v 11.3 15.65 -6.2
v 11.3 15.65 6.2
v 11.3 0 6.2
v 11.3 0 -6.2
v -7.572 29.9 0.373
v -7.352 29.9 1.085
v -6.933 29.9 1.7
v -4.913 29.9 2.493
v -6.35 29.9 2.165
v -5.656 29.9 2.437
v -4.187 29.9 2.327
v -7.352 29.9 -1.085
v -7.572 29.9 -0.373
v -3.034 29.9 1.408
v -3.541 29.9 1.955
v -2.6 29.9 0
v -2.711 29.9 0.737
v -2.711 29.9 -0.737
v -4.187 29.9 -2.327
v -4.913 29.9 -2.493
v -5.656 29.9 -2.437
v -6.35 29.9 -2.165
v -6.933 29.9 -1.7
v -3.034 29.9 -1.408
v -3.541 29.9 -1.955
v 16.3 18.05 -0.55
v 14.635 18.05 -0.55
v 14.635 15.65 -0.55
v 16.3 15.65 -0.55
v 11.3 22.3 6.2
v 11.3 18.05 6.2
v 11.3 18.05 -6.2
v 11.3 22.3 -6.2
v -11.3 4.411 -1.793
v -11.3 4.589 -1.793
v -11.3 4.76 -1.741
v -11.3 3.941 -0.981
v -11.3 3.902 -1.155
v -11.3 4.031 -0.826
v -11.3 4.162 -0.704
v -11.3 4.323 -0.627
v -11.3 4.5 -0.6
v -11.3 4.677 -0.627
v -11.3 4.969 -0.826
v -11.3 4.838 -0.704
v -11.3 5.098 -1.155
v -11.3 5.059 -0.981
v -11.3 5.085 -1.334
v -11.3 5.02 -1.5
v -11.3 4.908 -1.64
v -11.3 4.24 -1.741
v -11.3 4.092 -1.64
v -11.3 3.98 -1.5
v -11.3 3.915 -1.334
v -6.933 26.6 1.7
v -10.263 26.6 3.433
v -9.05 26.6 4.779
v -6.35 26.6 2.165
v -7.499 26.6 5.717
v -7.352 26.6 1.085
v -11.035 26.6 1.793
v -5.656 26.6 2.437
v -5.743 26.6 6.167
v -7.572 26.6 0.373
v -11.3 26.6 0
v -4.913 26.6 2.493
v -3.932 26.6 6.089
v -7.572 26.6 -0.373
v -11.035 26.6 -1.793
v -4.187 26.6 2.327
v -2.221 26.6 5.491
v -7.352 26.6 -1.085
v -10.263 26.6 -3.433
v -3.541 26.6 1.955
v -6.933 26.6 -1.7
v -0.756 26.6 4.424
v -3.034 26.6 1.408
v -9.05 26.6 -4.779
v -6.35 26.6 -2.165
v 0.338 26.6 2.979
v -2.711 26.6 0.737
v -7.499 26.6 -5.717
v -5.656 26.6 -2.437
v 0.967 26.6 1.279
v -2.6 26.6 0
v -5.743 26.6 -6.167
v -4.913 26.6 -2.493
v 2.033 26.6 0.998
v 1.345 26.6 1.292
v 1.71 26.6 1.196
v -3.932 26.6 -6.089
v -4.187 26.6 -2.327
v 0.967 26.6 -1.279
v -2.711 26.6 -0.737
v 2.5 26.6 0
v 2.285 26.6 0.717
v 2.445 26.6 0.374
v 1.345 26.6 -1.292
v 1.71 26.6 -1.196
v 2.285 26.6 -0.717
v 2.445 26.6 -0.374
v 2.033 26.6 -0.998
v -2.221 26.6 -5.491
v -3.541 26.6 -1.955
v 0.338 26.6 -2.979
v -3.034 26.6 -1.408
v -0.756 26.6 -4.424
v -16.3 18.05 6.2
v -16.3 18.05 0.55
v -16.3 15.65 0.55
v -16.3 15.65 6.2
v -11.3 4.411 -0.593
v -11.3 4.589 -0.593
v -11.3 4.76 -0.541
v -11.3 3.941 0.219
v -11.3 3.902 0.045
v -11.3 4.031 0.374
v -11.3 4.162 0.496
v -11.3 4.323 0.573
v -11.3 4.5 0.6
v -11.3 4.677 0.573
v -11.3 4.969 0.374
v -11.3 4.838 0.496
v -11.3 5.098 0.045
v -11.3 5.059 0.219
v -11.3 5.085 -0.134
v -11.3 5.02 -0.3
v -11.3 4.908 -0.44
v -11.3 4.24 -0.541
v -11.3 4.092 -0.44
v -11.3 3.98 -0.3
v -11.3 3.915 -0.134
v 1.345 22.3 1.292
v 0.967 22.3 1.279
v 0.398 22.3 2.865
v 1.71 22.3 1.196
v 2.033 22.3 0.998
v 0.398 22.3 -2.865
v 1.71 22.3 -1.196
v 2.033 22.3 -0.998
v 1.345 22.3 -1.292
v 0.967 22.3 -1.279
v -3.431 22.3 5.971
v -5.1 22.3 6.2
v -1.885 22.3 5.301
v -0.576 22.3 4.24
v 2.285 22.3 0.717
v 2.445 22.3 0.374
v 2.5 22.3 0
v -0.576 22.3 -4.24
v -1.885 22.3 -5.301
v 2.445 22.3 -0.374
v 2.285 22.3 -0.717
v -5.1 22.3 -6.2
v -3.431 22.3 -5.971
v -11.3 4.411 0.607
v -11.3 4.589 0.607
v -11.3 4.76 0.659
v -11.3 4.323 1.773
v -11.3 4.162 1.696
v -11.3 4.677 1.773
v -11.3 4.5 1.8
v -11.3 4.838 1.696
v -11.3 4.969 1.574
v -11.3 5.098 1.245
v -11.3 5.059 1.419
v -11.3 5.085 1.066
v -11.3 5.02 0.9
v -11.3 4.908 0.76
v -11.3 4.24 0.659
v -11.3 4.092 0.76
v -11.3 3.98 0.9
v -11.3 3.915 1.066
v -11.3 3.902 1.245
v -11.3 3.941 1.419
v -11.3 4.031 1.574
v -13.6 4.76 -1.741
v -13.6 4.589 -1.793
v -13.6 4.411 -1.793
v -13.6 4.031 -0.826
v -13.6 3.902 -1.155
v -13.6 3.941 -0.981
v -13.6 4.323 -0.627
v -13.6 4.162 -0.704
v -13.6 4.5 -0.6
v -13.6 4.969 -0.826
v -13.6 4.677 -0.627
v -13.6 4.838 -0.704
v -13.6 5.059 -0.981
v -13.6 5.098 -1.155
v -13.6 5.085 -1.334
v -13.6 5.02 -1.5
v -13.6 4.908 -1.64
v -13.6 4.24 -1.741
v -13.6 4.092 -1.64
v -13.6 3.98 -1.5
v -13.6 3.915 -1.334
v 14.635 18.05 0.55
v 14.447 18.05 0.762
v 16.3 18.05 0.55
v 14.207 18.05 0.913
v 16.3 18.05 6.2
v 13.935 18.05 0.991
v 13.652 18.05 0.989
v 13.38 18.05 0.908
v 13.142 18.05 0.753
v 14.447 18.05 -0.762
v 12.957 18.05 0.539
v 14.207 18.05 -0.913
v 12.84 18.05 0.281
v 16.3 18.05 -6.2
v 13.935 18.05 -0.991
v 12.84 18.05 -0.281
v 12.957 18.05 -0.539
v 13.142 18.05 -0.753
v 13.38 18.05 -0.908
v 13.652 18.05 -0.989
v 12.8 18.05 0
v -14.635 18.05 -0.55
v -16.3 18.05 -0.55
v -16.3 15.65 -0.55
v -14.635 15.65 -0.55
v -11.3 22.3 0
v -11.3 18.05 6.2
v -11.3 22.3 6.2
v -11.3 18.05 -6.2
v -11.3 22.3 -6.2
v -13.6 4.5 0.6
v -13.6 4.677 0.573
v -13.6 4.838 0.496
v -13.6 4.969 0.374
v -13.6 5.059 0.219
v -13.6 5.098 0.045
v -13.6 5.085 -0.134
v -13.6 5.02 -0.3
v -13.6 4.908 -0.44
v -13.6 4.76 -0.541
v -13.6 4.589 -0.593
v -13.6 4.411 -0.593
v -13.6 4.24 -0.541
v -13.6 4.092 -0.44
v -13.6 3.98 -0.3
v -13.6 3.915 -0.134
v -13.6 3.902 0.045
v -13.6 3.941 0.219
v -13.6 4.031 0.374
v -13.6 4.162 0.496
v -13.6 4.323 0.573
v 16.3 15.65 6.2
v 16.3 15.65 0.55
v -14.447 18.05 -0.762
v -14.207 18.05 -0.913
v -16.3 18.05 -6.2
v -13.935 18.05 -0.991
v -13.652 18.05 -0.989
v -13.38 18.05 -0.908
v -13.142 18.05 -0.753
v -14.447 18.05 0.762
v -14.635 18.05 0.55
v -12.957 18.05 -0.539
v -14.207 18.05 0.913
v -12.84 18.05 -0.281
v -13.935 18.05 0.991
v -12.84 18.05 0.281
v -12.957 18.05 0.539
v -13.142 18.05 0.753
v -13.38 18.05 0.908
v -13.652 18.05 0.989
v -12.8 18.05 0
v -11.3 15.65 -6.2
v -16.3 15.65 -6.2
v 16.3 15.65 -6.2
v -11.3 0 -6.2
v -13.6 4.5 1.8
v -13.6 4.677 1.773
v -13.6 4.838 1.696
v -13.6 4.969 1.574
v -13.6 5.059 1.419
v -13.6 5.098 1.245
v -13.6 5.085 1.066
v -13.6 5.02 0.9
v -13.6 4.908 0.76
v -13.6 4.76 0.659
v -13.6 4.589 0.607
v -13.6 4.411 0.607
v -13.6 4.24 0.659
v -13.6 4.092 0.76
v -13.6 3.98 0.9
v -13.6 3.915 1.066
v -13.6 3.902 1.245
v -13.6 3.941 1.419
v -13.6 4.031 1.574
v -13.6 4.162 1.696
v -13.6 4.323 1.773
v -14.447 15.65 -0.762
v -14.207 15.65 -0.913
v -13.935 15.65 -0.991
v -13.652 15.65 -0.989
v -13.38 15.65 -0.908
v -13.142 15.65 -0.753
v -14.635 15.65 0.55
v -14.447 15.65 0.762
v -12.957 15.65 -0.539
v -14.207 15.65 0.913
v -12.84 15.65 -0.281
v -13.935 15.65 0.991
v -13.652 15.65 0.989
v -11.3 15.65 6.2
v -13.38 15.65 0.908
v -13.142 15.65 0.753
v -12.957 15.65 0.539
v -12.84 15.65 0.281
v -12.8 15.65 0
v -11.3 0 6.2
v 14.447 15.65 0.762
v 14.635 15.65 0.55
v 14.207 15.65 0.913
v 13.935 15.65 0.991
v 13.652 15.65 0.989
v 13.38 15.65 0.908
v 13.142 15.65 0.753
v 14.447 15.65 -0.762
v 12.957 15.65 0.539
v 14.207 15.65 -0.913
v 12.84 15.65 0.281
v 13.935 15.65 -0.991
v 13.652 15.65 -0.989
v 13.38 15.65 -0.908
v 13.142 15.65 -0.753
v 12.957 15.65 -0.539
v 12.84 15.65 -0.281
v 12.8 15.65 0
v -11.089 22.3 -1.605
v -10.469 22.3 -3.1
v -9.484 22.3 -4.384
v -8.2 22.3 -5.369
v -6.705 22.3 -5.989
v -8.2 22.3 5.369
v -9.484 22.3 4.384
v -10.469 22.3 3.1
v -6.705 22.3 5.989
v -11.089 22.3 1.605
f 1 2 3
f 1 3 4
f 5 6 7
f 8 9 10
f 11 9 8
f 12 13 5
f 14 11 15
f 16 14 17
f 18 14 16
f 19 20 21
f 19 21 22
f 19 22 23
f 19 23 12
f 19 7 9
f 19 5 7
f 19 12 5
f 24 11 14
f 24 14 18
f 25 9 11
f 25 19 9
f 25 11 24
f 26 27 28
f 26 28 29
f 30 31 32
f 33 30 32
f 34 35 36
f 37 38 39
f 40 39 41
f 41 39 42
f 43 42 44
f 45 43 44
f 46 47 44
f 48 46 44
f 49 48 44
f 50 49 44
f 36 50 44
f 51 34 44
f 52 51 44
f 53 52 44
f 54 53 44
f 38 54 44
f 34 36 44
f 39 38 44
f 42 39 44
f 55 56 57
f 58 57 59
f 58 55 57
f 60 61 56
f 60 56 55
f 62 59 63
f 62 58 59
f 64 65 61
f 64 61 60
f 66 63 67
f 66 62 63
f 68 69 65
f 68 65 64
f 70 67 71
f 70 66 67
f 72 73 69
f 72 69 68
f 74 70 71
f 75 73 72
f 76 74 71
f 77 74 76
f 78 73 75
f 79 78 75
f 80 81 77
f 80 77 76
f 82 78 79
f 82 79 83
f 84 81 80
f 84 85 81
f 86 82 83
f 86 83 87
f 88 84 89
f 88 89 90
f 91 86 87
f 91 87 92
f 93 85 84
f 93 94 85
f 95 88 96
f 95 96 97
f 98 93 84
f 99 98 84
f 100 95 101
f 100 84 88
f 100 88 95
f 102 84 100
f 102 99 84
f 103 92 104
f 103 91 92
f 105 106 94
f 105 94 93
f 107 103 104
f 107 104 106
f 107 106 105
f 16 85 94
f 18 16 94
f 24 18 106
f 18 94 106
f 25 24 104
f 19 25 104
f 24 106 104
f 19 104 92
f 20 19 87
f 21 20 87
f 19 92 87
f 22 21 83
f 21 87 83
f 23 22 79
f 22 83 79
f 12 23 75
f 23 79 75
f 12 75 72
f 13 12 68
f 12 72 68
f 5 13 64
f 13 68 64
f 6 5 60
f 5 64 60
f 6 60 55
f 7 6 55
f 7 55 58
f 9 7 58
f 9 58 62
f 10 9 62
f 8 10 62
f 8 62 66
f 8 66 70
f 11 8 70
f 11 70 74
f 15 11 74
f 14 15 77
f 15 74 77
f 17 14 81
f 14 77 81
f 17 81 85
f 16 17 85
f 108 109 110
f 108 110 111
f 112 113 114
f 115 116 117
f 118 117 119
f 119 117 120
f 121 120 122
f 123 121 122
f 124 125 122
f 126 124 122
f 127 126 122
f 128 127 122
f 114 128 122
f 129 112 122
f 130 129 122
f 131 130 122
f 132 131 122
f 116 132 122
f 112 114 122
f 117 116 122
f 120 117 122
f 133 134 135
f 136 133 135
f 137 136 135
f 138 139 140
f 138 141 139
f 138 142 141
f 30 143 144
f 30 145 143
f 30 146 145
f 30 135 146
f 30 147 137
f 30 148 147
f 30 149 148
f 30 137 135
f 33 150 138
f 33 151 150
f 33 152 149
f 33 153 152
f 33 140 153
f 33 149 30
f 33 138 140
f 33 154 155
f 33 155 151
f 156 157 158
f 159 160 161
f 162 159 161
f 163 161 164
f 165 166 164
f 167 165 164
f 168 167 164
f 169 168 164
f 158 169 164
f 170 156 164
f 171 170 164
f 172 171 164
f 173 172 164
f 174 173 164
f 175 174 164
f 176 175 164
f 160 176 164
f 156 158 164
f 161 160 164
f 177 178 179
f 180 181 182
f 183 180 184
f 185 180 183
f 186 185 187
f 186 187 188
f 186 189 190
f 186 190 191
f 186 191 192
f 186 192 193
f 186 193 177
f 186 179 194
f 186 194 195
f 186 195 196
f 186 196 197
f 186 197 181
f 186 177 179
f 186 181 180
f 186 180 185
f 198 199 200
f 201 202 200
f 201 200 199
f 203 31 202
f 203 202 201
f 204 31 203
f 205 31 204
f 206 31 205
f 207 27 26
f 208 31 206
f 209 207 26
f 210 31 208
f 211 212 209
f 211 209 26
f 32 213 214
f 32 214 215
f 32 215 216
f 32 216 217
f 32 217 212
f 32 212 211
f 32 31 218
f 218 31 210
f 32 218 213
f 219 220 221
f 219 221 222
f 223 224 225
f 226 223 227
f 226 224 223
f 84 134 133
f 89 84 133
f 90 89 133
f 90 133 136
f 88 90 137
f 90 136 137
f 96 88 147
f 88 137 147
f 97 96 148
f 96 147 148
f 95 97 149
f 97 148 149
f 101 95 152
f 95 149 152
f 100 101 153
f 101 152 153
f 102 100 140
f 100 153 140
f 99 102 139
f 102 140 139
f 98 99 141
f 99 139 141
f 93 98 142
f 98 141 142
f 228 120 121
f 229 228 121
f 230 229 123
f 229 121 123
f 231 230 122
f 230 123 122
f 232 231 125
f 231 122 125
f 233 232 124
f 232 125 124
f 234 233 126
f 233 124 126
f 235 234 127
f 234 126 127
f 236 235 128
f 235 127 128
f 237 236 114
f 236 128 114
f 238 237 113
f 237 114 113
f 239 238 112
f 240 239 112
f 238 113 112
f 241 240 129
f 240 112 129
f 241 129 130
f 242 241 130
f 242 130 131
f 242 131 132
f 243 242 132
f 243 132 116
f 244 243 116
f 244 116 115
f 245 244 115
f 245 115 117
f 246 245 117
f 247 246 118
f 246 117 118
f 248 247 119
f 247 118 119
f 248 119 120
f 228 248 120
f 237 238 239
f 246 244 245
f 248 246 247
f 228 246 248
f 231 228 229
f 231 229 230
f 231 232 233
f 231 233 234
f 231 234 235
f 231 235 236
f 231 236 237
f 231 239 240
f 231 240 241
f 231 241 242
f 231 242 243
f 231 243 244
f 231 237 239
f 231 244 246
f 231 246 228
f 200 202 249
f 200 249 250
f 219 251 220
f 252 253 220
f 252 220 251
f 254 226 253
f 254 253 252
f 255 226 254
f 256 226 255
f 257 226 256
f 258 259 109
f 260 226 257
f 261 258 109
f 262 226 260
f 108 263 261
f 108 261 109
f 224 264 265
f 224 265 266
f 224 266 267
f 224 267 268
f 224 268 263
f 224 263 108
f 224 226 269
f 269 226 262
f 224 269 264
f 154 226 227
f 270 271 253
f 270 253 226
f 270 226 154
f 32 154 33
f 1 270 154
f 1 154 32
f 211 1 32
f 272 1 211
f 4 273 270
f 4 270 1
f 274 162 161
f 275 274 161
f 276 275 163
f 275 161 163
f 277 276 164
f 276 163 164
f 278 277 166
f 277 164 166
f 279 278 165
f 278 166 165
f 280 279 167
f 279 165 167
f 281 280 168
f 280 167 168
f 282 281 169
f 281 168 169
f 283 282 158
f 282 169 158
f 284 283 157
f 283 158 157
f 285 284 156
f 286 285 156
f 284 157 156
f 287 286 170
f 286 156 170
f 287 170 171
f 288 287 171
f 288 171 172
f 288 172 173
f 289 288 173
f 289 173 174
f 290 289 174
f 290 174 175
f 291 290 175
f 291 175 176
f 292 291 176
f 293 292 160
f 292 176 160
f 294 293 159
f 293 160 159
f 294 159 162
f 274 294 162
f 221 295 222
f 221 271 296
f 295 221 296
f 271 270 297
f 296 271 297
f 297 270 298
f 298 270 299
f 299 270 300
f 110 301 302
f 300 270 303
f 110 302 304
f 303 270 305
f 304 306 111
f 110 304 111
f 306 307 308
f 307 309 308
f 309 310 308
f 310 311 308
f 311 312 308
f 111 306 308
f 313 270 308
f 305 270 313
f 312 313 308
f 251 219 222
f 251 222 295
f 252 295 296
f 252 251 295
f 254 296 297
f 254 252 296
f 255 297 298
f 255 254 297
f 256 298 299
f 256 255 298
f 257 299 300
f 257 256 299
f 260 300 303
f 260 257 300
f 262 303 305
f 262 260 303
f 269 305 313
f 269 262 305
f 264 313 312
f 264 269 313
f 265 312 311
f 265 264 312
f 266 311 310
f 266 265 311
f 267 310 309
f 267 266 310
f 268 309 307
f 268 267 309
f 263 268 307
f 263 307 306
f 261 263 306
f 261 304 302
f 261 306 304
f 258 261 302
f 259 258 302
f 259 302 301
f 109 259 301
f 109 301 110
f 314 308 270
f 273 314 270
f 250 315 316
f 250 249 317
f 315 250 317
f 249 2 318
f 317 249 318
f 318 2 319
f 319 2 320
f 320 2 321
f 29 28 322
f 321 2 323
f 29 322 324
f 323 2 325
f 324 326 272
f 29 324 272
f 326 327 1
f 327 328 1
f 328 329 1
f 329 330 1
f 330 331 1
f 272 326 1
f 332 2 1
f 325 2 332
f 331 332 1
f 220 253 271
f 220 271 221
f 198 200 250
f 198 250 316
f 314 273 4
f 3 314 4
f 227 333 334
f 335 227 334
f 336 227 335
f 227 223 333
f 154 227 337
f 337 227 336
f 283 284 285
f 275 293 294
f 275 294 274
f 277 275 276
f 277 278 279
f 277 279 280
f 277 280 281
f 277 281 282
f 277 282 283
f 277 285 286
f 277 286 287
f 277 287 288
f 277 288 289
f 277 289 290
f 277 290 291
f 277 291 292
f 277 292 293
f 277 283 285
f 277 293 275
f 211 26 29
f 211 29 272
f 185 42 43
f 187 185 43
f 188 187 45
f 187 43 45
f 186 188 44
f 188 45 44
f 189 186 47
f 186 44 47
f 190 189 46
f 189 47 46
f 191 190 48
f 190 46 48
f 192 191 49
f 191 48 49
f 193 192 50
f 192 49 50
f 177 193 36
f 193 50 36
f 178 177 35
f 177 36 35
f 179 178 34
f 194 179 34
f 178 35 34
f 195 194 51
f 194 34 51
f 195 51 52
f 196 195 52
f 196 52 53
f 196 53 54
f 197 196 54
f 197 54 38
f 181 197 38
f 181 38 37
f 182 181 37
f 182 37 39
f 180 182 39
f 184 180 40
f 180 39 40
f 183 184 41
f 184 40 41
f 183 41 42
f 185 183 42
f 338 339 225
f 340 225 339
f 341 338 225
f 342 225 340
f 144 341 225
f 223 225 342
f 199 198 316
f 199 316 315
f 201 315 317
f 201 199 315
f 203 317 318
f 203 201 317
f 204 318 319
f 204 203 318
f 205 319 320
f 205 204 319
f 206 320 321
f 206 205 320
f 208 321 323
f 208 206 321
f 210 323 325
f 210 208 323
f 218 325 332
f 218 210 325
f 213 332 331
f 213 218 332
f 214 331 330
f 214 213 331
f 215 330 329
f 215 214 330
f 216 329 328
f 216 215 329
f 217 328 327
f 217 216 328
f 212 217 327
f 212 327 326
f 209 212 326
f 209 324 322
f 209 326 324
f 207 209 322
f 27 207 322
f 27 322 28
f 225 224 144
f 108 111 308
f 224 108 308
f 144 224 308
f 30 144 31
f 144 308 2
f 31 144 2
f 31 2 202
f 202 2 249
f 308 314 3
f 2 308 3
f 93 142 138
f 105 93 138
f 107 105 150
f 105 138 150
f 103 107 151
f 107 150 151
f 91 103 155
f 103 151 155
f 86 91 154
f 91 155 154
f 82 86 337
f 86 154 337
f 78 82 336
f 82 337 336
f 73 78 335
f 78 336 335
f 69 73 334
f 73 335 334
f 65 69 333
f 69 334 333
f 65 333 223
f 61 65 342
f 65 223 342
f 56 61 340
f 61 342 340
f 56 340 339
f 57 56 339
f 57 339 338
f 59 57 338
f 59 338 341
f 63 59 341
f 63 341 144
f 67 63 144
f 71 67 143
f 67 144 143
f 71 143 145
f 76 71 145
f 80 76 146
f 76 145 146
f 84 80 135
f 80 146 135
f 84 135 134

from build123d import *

# Parameters (mm, degrees)
SKETCH1_W             = 22.6
SKETCH1_H             = 12.4
BOSS_EXTRUDE1_DEPTH   = 22.3
SKETCH2_W             = 12.4
SKETCH2_H             = 2.4
BOSS_EXTRUDE2_DEPTH   = 5
SKETCH3_W             = 12.4
SKETCH3_H             = 2.4
BOSS_EXTRUDE3_DEPTH   = 5
CUT_EXTRUDE1_REACH    = 27.098
BOSS_EXTRUDE4_DEPTH   = 4.3
SKETCH7_R             = 2.5
BOSS_EXTRUDE5_DEPTH   = 3.3
SKETCH8_R             = 0.6
BOSS_EXTRUDE7_DEPTH   = 2.3
BOSS_EXTRUDE7_2_DEPTH = 2.3
BOSS_EXTRUDE7_3_DEPTH = 2.3


with BuildPart() as part:
    # Sketch1 → Boss-Extrude1 (new body)
    with BuildSketch(Plane(origin=(0, 0, 0), x_dir=(1, 0, 0), z_dir=(0, 1, 0))):
        Rectangle(SKETCH1_W, SKETCH1_H)
    extrude(amount=BOSS_EXTRUDE1_DEPTH)

    # Sketch2 → Boss-Extrude2 (add)
    with BuildSketch(Plane(origin=(11.3, 0, 0), x_dir=(0, 0, -1), z_dir=(1, 0, 0))):
        with Locations((0, 16.85)):
            Rectangle(SKETCH2_W, SKETCH2_H)
    extrude(amount=BOSS_EXTRUDE2_DEPTH)

    # Sketch3 → Boss-Extrude3 (add)
    with BuildSketch(Plane.ZY.offset(11.3)):
        with Locations((0, 16.85)):
            Rectangle(SKETCH3_W, SKETCH3_H)
    extrude(amount=BOSS_EXTRUDE3_DEPTH)

    # Sketch4 → Cut-Extrude1 (cut, up to next)
    with BuildSketch(Plane(origin=(0, 18.05, 0), x_dir=(1, 0, 0), z_dir=(0, 1, 0)), mode=Mode.PRIVATE) as cut_extrude1_sk1:
        with BuildLine():
            Line((-16.3, 0.55), (-14.635164654, 0.55))
            ThreePointArc((-14.635164654, 0.55), (-12.8, 0), (-14.635164654, -0.55))
            Line((-14.635164654, -0.55), (-16.3, -0.55))
            Line((-16.3, -0.55), (-16.3, 0.55))
        make_face()
    cut_extrude1_tool1 = extrude(cut_extrude1_sk1.sketch, amount=-CUT_EXTRUDE1_REACH, mode=Mode.PRIVATE) & part.part
    # Sketch4 → Cut-Extrude1 (cut, up to next)
    with BuildSketch(Plane(origin=(0, 18.05, 0), x_dir=(1, 0, 0), z_dir=(0, 1, 0)), mode=Mode.PRIVATE) as cut_extrude1_sk2:
        with BuildLine():
            Line((16.3, -0.55), (14.635164654, -0.55))
            ThreePointArc((14.635164654, -0.55), (12.8, 0), (14.635164654, 0.55))
            Line((14.635164654, 0.55), (16.3, 0.55))
            Line((16.3, 0.55), (16.3, -0.55))
        make_face()
    cut_extrude1_tool2 = extrude(cut_extrude1_sk2.sketch, amount=-CUT_EXTRUDE1_REACH, mode=Mode.PRIVATE) & part.part
    add(cut_extrude1_tool1.solids().sort_by_distance((-14.40681, 18.05, 0))[0], mode=Mode.SUBTRACT)
    add(cut_extrude1_tool2.solids().sort_by_distance((14.40681, 18.05, 0))[0], mode=Mode.SUBTRACT)

    # Sketch6 → Boss-Extrude4 (add)
    with BuildSketch(Plane(origin=(0, 22.3, 0), x_dir=(1, 0, 0), z_dir=(0, 1, 0))):
        with BuildLine():
            ThreePointArc((1.2, -1.3), (2.5, 0), (1.2, 1.3))
            ThreePointArc((1.2, 1.3), (1.082856772, 1.294711344), (0.966666667, 1.278888406))
            ThreePointArc((0.966666667, 1.278888406), (0.964431433, 1.289446156), (0.962177826, 1.3))
            ThreePointArc((0.962177826, 1.3), (-11.3, 0), (0.962177826, -1.3))
            ThreePointArc((0.962177826, -1.3), (0.964431433, -1.289446156), (0.966666667, -1.278888406))
            ThreePointArc((0.966666667, -1.278888406), (1.082856772, -1.294711344), (1.2, -1.3))
        make_face()
    extrude(amount=BOSS_EXTRUDE4_DEPTH)

    # Sketch7 → Boss-Extrude5 (add)
    with BuildSketch(Plane(origin=(0, 26.6, 0), x_dir=(1, 0, 0), z_dir=(0, 1, 0))):
        with Locations((-5.1, 0)):
            Circle(SKETCH7_R)
    extrude(amount=BOSS_EXTRUDE5_DEPTH)


with BuildPart() as body_2:
    # Sketch8 → Boss-Extrude7 (new body)
    with BuildSketch(Plane.ZY.offset(11.3)):
        with Locations((-1.2, 4.5)):
            Circle(SKETCH8_R)
    extrude(amount=BOSS_EXTRUDE7_DEPTH)


with BuildPart() as body_3:
    # Sketch8 → Boss-Extrude7 2 (new body)
    with BuildSketch(Plane.ZY.offset(11.3)):
        with Locations((1.2, 4.5)):
            Circle(SKETCH8_R)
    extrude(amount=BOSS_EXTRUDE7_2_DEPTH)


with BuildPart() as body_4:
    # Sketch8 → Boss-Extrude7 3 (new body)
    with BuildSketch(Plane.ZY.offset(11.3)):
        with BuildLine():
            ThreePointArc((0.6, 4.5), (0, 5.1), (-0.6, 4.5))
            ThreePointArc((-0.6, 4.5), (0, 3.9), (0.6, 4.5))
        make_face()
    extrude(amount=BOSS_EXTRUDE7_3_DEPTH)


solid = Compound([part.part, body_2.part, body_3.part, body_4.part])
